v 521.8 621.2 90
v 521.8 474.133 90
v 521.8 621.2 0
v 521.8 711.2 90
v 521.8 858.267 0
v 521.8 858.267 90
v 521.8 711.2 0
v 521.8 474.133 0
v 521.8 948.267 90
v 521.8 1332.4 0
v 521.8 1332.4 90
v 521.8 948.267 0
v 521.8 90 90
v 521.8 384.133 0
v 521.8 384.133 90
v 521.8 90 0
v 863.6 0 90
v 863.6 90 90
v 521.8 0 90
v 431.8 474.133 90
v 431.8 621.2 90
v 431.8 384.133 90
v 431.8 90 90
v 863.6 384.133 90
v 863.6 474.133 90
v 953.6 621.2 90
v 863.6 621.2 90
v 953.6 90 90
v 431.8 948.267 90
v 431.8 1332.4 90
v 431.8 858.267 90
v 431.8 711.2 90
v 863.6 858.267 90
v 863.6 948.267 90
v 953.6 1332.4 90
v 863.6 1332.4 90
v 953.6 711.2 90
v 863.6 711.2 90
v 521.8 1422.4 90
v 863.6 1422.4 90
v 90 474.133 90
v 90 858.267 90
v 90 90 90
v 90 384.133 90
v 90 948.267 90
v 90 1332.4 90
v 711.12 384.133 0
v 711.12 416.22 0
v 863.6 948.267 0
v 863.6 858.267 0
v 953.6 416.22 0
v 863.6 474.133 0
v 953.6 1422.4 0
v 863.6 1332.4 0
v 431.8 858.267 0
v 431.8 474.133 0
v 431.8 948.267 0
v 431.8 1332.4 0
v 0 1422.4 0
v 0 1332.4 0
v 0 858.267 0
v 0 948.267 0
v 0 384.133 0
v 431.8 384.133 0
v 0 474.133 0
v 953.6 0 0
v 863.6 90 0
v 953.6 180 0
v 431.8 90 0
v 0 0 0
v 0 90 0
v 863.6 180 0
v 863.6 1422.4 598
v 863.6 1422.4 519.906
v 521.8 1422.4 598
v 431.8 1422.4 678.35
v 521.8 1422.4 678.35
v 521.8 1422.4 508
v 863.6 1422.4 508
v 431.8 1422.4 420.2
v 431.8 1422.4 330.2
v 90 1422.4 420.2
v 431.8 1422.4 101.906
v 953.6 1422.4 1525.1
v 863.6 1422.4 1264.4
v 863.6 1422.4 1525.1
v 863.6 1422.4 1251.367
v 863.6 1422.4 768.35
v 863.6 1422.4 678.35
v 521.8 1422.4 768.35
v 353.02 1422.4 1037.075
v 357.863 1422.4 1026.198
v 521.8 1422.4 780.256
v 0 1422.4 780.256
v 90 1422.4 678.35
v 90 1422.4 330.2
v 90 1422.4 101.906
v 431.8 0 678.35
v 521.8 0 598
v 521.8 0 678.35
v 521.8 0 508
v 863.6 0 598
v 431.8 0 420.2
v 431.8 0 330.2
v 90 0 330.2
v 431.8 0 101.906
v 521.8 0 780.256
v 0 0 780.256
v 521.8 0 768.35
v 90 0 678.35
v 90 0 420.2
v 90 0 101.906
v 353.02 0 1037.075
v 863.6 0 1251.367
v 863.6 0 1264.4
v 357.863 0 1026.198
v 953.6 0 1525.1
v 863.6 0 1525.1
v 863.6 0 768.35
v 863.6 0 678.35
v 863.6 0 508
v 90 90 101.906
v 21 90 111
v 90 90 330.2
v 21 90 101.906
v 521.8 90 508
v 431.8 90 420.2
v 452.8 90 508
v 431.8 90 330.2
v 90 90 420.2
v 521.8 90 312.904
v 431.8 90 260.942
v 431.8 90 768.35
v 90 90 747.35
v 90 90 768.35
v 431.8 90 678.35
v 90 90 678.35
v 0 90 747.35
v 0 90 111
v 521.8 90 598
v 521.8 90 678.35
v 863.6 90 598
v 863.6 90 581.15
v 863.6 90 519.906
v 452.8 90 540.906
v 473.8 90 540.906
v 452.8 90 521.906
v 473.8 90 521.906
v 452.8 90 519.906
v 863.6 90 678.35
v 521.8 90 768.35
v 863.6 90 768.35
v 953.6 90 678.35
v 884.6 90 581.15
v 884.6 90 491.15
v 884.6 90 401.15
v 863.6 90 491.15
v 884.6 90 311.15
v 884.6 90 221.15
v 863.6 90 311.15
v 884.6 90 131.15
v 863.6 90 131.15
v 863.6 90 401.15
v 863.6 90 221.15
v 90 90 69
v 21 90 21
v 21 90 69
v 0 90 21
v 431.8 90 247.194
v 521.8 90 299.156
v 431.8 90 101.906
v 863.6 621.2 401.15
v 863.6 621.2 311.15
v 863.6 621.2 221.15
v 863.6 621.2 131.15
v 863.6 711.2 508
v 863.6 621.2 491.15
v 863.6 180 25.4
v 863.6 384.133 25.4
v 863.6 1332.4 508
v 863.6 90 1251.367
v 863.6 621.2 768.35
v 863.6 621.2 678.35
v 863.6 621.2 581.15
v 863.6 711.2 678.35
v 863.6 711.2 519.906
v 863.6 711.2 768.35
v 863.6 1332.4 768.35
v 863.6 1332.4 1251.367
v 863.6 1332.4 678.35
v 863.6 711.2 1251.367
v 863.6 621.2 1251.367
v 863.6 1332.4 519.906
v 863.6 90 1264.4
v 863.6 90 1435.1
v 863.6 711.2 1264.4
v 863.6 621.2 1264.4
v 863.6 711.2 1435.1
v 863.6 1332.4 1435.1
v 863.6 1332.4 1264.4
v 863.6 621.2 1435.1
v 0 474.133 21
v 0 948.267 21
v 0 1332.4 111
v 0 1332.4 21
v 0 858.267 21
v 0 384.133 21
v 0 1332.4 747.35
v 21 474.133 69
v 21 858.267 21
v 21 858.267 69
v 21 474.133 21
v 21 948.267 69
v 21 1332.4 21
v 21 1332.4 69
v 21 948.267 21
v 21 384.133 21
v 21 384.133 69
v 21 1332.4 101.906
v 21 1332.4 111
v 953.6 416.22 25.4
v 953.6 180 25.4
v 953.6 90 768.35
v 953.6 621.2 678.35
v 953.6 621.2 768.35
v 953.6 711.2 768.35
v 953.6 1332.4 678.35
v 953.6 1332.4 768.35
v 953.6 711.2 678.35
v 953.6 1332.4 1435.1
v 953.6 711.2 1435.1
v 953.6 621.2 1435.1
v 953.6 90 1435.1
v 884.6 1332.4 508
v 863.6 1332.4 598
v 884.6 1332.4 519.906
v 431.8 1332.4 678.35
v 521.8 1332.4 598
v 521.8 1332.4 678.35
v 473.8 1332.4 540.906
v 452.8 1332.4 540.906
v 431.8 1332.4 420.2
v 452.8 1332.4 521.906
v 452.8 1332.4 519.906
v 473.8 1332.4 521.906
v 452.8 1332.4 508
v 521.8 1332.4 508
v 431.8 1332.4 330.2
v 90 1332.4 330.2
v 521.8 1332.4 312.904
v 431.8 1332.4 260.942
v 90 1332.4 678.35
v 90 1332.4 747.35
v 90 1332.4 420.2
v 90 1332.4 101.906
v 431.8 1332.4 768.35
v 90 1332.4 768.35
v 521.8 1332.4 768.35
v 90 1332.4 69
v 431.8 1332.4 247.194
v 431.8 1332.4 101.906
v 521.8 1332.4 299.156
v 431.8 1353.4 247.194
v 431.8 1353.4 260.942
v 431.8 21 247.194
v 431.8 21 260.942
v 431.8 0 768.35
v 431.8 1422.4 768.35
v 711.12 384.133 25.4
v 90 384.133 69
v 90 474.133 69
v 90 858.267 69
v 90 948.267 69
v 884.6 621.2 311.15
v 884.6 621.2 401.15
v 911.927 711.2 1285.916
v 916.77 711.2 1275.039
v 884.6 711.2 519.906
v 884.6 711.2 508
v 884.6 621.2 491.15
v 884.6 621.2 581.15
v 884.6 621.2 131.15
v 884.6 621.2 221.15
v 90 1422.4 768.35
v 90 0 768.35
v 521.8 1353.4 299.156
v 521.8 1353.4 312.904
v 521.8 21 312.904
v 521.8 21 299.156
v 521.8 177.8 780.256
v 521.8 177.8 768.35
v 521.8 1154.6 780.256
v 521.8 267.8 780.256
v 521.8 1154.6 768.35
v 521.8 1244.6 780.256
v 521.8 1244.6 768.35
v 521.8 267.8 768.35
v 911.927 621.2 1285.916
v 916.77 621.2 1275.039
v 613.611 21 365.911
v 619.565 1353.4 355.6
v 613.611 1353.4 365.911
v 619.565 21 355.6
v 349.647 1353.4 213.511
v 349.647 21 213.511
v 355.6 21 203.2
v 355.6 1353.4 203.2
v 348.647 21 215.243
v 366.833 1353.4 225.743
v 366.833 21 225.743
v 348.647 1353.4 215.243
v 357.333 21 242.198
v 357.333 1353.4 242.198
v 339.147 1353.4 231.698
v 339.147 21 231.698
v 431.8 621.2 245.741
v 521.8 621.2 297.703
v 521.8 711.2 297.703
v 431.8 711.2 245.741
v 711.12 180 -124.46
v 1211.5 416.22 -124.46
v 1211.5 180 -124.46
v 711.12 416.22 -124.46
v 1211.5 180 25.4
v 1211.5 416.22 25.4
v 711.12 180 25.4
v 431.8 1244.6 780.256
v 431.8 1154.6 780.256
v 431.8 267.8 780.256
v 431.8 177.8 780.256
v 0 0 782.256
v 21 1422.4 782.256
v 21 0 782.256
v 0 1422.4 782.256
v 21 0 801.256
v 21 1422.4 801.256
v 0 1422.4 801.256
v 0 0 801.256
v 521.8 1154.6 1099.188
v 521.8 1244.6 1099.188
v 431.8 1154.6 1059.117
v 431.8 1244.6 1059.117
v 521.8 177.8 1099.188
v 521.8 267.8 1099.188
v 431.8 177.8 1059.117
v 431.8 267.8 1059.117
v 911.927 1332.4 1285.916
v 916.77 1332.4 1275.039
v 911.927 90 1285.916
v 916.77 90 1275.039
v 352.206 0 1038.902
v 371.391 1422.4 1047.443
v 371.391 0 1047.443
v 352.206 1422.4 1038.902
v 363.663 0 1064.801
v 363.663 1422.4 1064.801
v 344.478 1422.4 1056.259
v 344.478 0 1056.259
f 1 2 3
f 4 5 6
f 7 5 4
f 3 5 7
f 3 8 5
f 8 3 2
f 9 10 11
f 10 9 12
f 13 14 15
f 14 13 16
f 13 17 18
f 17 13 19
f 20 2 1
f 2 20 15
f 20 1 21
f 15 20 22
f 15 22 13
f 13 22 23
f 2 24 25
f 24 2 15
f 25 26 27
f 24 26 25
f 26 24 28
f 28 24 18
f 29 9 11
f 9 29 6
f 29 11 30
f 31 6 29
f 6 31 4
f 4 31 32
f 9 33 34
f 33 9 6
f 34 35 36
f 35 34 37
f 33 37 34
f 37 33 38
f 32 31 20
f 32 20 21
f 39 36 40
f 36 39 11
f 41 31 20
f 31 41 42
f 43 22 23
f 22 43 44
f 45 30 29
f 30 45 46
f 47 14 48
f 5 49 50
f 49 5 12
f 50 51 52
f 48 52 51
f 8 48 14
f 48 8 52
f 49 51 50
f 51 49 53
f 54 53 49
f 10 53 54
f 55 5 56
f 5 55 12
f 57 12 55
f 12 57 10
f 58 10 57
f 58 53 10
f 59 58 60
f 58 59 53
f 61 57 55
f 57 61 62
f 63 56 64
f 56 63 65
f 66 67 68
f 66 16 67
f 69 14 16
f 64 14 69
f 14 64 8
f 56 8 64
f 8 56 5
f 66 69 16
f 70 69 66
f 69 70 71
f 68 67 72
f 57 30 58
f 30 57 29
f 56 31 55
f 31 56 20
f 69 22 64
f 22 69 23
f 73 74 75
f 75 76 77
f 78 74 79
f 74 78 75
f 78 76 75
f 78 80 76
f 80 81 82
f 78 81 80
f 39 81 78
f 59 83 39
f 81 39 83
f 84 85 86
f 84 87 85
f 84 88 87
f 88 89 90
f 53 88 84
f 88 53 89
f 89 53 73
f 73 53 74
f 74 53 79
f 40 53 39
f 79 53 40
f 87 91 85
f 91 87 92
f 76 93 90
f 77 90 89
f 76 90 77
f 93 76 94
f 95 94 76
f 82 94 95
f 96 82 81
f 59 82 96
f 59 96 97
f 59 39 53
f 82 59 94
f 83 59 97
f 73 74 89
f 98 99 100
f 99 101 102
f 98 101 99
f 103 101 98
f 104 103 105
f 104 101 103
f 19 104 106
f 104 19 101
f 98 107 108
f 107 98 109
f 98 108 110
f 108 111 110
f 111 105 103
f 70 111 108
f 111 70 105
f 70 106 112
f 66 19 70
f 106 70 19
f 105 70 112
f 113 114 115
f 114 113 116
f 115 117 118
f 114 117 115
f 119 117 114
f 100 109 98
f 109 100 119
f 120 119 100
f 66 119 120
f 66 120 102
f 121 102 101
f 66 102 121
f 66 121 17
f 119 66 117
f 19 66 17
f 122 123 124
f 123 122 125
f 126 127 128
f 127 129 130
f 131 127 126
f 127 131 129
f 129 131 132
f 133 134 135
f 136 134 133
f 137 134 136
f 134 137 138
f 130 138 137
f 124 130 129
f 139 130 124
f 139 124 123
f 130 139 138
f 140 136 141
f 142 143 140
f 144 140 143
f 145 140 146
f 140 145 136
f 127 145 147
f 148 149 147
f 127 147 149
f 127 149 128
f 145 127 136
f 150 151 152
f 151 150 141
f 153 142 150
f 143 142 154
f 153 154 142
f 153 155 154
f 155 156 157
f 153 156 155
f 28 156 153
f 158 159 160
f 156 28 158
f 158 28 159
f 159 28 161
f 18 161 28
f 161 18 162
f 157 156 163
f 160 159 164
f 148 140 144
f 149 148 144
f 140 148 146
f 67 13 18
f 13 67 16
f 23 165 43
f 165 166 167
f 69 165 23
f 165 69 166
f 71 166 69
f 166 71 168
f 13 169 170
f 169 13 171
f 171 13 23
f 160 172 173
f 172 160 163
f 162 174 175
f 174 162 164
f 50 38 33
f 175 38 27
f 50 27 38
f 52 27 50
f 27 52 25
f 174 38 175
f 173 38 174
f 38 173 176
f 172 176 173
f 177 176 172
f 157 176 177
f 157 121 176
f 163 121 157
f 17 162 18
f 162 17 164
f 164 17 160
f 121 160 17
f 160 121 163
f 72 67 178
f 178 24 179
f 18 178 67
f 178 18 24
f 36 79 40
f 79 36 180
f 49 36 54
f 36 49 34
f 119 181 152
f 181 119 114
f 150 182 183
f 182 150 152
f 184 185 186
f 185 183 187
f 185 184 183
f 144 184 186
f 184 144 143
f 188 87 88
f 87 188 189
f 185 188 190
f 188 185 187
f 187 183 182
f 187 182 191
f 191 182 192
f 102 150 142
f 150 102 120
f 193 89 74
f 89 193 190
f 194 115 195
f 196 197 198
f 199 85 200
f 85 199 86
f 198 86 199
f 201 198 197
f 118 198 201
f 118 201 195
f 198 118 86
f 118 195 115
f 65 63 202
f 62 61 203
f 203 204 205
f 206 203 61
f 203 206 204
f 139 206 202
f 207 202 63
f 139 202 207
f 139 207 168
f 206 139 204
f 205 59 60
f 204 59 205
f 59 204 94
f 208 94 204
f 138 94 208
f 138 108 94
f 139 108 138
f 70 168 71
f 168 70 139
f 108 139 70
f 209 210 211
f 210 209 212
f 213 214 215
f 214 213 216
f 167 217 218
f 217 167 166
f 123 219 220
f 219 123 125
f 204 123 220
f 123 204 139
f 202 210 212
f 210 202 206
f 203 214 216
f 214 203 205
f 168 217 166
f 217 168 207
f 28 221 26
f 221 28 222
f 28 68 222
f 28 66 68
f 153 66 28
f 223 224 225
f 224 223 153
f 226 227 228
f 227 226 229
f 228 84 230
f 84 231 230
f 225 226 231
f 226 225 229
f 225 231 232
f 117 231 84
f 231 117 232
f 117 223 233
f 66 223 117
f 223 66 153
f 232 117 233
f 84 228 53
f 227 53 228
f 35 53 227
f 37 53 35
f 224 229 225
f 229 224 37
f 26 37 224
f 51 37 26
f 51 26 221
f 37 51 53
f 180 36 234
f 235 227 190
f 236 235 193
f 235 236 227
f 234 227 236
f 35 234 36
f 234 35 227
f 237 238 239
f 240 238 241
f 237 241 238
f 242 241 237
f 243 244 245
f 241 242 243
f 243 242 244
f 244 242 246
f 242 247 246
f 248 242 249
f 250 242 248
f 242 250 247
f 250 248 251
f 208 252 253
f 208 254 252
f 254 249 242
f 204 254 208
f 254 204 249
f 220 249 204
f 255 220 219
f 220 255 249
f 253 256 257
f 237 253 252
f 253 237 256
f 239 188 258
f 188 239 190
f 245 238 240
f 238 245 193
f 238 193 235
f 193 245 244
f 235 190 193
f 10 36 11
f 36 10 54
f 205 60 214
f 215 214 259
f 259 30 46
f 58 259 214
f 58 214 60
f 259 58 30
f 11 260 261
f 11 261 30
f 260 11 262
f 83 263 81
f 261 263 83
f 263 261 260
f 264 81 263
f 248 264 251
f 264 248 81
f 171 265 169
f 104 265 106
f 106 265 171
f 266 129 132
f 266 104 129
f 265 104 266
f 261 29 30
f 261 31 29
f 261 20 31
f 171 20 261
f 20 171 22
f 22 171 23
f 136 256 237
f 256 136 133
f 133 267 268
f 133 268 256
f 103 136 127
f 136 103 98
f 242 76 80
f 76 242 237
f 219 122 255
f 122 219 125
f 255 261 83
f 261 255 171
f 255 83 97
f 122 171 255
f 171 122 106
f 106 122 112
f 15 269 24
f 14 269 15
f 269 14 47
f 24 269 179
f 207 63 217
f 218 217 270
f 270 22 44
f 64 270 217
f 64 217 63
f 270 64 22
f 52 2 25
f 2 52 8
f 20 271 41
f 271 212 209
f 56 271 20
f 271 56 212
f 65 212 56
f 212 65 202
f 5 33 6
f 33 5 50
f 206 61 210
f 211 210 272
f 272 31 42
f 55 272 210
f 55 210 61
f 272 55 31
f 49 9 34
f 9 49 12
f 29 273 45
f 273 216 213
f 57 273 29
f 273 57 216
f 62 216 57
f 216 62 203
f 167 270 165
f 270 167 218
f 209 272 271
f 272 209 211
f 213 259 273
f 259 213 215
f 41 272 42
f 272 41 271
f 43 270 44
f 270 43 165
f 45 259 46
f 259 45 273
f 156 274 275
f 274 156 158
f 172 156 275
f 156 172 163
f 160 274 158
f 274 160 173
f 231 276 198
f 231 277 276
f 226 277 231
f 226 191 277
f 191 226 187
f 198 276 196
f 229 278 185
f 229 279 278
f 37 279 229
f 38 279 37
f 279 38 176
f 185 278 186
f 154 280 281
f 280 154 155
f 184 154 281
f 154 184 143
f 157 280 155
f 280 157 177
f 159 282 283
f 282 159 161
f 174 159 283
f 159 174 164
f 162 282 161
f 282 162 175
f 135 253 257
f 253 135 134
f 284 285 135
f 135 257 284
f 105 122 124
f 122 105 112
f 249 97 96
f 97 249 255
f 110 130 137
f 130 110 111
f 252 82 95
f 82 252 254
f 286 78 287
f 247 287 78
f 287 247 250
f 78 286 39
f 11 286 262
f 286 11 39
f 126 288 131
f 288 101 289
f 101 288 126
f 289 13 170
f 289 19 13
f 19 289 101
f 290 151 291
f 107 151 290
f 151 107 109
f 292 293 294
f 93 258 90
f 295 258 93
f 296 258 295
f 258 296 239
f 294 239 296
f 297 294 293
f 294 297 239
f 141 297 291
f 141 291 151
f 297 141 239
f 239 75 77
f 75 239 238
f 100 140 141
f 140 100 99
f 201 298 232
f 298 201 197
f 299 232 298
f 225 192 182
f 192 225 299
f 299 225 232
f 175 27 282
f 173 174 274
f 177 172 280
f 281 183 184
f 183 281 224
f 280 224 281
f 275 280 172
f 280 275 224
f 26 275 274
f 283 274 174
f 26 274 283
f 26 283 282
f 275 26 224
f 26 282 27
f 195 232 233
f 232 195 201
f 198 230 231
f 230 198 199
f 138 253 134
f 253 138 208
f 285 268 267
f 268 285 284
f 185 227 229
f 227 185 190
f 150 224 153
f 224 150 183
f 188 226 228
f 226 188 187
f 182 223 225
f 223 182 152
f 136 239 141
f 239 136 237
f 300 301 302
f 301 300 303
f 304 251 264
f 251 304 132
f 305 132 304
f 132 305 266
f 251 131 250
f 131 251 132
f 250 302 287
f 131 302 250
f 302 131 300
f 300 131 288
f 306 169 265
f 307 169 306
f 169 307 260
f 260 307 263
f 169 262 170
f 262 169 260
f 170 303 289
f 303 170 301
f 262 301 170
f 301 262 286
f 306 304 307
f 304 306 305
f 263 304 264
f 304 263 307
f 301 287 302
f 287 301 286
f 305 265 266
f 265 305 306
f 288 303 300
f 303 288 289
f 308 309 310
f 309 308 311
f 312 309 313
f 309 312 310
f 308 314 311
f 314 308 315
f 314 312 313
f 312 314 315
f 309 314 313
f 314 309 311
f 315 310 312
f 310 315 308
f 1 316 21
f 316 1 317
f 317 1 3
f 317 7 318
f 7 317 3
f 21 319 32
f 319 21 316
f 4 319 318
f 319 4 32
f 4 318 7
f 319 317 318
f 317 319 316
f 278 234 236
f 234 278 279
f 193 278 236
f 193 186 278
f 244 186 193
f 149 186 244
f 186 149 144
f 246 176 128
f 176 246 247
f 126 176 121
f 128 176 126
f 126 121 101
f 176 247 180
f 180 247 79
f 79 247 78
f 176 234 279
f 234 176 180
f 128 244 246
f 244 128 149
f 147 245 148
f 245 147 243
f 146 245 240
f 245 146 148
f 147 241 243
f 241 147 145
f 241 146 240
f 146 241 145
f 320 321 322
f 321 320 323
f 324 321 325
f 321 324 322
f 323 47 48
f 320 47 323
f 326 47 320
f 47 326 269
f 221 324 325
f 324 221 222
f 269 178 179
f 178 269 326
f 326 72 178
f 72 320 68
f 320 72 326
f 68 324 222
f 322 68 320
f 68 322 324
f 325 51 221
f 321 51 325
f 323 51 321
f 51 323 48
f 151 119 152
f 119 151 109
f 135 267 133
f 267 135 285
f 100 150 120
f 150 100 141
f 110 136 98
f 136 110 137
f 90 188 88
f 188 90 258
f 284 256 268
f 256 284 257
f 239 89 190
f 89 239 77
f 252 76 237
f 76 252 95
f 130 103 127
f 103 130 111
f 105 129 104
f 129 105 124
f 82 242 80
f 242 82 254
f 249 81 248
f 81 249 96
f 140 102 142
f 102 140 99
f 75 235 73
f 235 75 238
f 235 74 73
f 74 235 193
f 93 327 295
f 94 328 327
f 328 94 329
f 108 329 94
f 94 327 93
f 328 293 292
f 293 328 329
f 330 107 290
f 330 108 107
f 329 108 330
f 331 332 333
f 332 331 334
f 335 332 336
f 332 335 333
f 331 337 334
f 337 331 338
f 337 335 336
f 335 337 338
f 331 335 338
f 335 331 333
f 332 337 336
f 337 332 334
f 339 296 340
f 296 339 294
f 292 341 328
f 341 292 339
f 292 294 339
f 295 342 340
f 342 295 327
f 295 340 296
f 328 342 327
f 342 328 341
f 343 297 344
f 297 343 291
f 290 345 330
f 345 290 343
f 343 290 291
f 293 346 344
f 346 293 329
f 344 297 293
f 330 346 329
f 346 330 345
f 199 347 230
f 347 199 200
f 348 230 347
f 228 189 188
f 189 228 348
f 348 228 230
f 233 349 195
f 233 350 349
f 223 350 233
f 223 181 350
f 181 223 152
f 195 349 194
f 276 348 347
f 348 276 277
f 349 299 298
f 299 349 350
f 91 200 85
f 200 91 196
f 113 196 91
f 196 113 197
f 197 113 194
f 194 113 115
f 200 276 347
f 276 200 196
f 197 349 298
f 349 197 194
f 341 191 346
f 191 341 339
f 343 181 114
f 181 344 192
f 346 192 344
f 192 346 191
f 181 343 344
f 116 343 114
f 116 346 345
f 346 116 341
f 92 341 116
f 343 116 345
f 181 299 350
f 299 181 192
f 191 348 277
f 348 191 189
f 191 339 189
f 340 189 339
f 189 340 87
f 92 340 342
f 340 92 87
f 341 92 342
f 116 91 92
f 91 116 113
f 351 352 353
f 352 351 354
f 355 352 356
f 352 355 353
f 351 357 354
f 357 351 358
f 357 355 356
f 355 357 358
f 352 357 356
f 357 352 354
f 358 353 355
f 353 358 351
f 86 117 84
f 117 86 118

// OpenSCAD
// file: wood.scad
// PARAMETERS {{{1
// units are in mm 
inch = 25.4;
// base parameters
oneby = 19;
twoby = 21;
fourby = 90;
// plywood thickness
threequarters = 23 / 32 * inch;
onehalf = 15 / 32 * inch;
onequarter = 7 / 32 * inch;
// 1}}}
// MODULES {{{1
// wood definitions {{{2
module onebytwo(length) {
    cube([oneby, length, twoby]);
}
module twobyfour(length) {
    cube([twoby, length, fourby]);
}
module twobytwo(length) {
    cube([twoby, length, twoby]);
}
module fourbyfour(length) {
    cube([fourby, length, fourby]);
}
module plywood3quarters(length, width) {
  cube([length, width, threequarters]);
}
module plywoodhalf(length, width) {
  cube([length, width, onehalf]);
}
module plywoodquarter(length, width) {
  cube([length, width, onequarter]);
}
// 2}}}
// wood working modules
module tenon(width, depth, height) {
    difference() {
        cube([width, depth, height]);
        translate([width/4, depth/4, -1])
        cube([width/2, depth/2, height+2]);
    }
}

module mortise(width, depth, height = twoby) {
  rotate([90, 0, 0])
    union() {
        cube([width, depth, height]);
        translate([width/4, depth/4, height])
        cube([width/2, depth/2, height/2]);
    }
}
// 2}}}
// applied modules
module mortised4x4(length) {
  union() {
    translate([0, fourby, 0])
    fourbyfour(length - fourby * 2);
    // tenon at one end
    translate([fourby - twoby, fourby + twoby, 0])
    mortise(twoby, fourby, fourby);
    // end of fourbyfour
    translate([0, length - fourby, fourby])
    rotate([180, 0, 0])
    mortise(fourby, fourby, fourby);
  }
}
// 1}}}
//
/*mortise(fourby, fourby, fourby);*/
// mortised4x4(23 * inch);
/*tenon2x4x4(13 * inch);*/
/*color("#3434bc")*/
/*translate([0, 0, 100])*/
/*tenon(10, 10, 10);*/
// main file
include <wood.scad>

keyboard_shelf_height = 30.25 * inch;
second_shelf_height = 12.25 * inch;
third_shelf_height = second_shelf_height + 14 * inch;

width = 56 * inch;
depth = 34 * inch;
height = keyboard_shelf_height + third_shelf_height;

rack_5u_height = 19.7 * inch;
rack_5u_depth = 9.3 * inch;
rack_5u_width = 5.9 * inch;

midi_pedal_keyboard_height = 13 * inch;


module base() {
  union() {
    translate([(depth / 2), 0, 0])
    fourbyfour(width);
    rotate([0, 0, -90])
    translate([-fourby, 0, 0])
    fourbyfour(depth);
    translate([0, 0, twoby])
    twobyfour(width);
    translate([depth, 0, 0])
    fourbyfour(width);
    rotate([0, 0, -90])
    translate([-width, 0, 0])
    fourbyfour(depth);
    // pedal board top
    // TODO - add cutouts for cables, etc.
    translate([0, 0, fourby])
    plywoodhalf(depth / 2, width);
    rotate([0, 0, -90])
    translate([-width / 3, 0, 0])
    fourbyfour(depth);
    rotate([0, 0, -90])
    translate([-width / 3 * 2, 0, 0])
    fourbyfour(depth);
    translate([0, 0, fourby])
    rotate([0, 90, 0])
    twobyfour(width);
  }
}

module supports() {
  color("#e3c2b9")
  rotate([90, 0, 0]) {
    translate([0, 0, -fourby])
    fourbyfour(keyboard_shelf_height);
    translate([0, 0, -width])
    fourbyfour(keyboard_shelf_height);
    translate([depth, 0, -fourby])
    fourbyfour(keyboard_shelf_height);
    translate([depth, 0, -width])
    fourbyfour(keyboard_shelf_height);
    translate([depth / 2, 0, -fourby])
    fourbyfour(keyboard_shelf_height);
    translate([depth / 2, 0, -width])
    fourbyfour(keyboard_shelf_height);
    translate([depth, 0, -width/2])
    fourbyfour(height);
    // midi pedal support
  }
}
module shelf(w, l) {
  union() {
    plywoodhalf(l, w);
    rotate([0, 90, 0])
    translate([-onehalf-twoby, 0, 0])
    onebytwo(w);
  }
}
module midi_pedal_board() {
  translate([depth / 2 - 3 * inch, twoby, 8 * inch])
  rotate([0, -30, 0])
  shelf(width - fourby, 12 * inch);
}

module midi_pedal_support() {
  translate([depth / 2, width/2, midi_pedal_keyboard_height])
  rotate([90, 180, 90])
    union() {
      difference() {
            fourbyfour(midi_pedal_keyboard_height);
            translate([0, -16, -80])
            rotate([30, 0, 0])
            cube([5 * inch, 5 * inch, 8 *inch]);
        }
    }
}
module second_supports() {
  rotate([90, 0, 0]) {
    color("#a2e4f6")
    translate([depth / 2, 0, -width + width/8])
    union() {
      difference() {
        fourbyfour(second_shelf_height + fourby);
        rotate([-24, 90, 0])
        translate([-3.6 * inch, second_shelf_height - 1.4 * inch, 0])
        cube([8 * inch, 5 * inch, 10 * inch]);
      }
    }
    color("#a2e4f6")
    translate([depth / 2, 0, -fourby - width/8])
    union() {
      difference() {
        fourbyfour(second_shelf_height + fourby);
        rotate([-24, 90, 0])
        translate([-3.6 * inch, second_shelf_height - 1.4 * inch, 0])
        cube([8 * inch, 5 * inch, 10 * inch]);
      }
    }
    color("#3e2b6f")
    translate([depth, 0, -width])
    fourbyfour(third_shelf_height);
    color("#3e2b6f")
    translate([depth, 0, -fourby])
    fourbyfour(third_shelf_height);
  }
  rotate([0, -24, 0])
  translate([(depth / 2), 0, fourby])
  shelf(width, depth / 2 + fourby * 2);
  // TODO - cut out the necessary space for a monitor stand
}

module rack_5u() {
  rotate([0, 90, 0])
  cube([rack_5u_width, rack_5u_depth, rack_5u_height]);
}


module model() {
  base();
  color("#def4c2") {
    translate([depth, 0, second_shelf_height])
    twobyfour(width / 2);
    translate([depth, 0, second_shelf_height + fourby * 2])
    twobyfour(width / 2);
    translate([depth, 0, second_shelf_height - fourby * 2])
    twobyfour(width / 2);
  }
  supports();
  rotate([0, 90, 0])
  translate([-keyboard_shelf_height, 0, 0])
  color("#cae3b3") {
    twobyfour(width);
    translate([0, 0, depth])
    fourbyfour(width);
    translate([0, 0, depth / 2])
    fourbyfour(width);
  }
  midi_pedal_board();
  midi_pedal_support();
  back_shelf_h = 20 * inch;
  translate([depth / 2 + twoby, 0, back_shelf_h]) {
    union() {
      /*difference() {*/
        shelf(width, depth / 2);
        translate([depth / 2 - fourby * 3 + 3.8 * inch, fourby * 2, -20 * inch + 1 * inch])
        rack_5u();
        // todo difference this out with the 5U rack
        // linear extrude a rounded rectangle
      /*}*/
    }
  }
  color("#e39b3a")
  rotate([0, 0, 90]) {
    translate([0, -depth, keyboard_shelf_height - fourby])
    fourbyfour(depth);
    translate([width - fourby, -depth, keyboard_shelf_height - fourby])
    fourbyfour(depth);
  }
  color("#3e4d8f")
  rotate([0, 0, 90]) {
    translate([0, -13.5 * inch - fourby, 13 * inch])
    fourbyfour(depth / 2);
    translate([width - fourby, -13.5 * inch - fourby, 13 * inch])
    fourbyfour(depth / 2);
  }
  translate([depth / 2, 0, back_shelf_h])
  color("#e2ca91") {
    rotate([0, 0, 90])
    translate([0, -depth / 2 - fourby / 2, 0])
    fourbyfour(depth / 2);
    rotate([0, 0, 90])
    translate([width - fourby, -depth / 2, 0])
    fourbyfour(depth / 2);
  }
  translate([0, 0, keyboard_shelf_height])
  shelf(width, depth / 2 + fourby);
  translate([0, 0, keyboard_shelf_height])
  second_supports(); // TODO - add divets for objects and cutout for monitor stand
  translate([depth, 0, keyboard_shelf_height + third_shelf_height]) 
  fourbyfour(width);
}
model();

/*rack_5u();*/
